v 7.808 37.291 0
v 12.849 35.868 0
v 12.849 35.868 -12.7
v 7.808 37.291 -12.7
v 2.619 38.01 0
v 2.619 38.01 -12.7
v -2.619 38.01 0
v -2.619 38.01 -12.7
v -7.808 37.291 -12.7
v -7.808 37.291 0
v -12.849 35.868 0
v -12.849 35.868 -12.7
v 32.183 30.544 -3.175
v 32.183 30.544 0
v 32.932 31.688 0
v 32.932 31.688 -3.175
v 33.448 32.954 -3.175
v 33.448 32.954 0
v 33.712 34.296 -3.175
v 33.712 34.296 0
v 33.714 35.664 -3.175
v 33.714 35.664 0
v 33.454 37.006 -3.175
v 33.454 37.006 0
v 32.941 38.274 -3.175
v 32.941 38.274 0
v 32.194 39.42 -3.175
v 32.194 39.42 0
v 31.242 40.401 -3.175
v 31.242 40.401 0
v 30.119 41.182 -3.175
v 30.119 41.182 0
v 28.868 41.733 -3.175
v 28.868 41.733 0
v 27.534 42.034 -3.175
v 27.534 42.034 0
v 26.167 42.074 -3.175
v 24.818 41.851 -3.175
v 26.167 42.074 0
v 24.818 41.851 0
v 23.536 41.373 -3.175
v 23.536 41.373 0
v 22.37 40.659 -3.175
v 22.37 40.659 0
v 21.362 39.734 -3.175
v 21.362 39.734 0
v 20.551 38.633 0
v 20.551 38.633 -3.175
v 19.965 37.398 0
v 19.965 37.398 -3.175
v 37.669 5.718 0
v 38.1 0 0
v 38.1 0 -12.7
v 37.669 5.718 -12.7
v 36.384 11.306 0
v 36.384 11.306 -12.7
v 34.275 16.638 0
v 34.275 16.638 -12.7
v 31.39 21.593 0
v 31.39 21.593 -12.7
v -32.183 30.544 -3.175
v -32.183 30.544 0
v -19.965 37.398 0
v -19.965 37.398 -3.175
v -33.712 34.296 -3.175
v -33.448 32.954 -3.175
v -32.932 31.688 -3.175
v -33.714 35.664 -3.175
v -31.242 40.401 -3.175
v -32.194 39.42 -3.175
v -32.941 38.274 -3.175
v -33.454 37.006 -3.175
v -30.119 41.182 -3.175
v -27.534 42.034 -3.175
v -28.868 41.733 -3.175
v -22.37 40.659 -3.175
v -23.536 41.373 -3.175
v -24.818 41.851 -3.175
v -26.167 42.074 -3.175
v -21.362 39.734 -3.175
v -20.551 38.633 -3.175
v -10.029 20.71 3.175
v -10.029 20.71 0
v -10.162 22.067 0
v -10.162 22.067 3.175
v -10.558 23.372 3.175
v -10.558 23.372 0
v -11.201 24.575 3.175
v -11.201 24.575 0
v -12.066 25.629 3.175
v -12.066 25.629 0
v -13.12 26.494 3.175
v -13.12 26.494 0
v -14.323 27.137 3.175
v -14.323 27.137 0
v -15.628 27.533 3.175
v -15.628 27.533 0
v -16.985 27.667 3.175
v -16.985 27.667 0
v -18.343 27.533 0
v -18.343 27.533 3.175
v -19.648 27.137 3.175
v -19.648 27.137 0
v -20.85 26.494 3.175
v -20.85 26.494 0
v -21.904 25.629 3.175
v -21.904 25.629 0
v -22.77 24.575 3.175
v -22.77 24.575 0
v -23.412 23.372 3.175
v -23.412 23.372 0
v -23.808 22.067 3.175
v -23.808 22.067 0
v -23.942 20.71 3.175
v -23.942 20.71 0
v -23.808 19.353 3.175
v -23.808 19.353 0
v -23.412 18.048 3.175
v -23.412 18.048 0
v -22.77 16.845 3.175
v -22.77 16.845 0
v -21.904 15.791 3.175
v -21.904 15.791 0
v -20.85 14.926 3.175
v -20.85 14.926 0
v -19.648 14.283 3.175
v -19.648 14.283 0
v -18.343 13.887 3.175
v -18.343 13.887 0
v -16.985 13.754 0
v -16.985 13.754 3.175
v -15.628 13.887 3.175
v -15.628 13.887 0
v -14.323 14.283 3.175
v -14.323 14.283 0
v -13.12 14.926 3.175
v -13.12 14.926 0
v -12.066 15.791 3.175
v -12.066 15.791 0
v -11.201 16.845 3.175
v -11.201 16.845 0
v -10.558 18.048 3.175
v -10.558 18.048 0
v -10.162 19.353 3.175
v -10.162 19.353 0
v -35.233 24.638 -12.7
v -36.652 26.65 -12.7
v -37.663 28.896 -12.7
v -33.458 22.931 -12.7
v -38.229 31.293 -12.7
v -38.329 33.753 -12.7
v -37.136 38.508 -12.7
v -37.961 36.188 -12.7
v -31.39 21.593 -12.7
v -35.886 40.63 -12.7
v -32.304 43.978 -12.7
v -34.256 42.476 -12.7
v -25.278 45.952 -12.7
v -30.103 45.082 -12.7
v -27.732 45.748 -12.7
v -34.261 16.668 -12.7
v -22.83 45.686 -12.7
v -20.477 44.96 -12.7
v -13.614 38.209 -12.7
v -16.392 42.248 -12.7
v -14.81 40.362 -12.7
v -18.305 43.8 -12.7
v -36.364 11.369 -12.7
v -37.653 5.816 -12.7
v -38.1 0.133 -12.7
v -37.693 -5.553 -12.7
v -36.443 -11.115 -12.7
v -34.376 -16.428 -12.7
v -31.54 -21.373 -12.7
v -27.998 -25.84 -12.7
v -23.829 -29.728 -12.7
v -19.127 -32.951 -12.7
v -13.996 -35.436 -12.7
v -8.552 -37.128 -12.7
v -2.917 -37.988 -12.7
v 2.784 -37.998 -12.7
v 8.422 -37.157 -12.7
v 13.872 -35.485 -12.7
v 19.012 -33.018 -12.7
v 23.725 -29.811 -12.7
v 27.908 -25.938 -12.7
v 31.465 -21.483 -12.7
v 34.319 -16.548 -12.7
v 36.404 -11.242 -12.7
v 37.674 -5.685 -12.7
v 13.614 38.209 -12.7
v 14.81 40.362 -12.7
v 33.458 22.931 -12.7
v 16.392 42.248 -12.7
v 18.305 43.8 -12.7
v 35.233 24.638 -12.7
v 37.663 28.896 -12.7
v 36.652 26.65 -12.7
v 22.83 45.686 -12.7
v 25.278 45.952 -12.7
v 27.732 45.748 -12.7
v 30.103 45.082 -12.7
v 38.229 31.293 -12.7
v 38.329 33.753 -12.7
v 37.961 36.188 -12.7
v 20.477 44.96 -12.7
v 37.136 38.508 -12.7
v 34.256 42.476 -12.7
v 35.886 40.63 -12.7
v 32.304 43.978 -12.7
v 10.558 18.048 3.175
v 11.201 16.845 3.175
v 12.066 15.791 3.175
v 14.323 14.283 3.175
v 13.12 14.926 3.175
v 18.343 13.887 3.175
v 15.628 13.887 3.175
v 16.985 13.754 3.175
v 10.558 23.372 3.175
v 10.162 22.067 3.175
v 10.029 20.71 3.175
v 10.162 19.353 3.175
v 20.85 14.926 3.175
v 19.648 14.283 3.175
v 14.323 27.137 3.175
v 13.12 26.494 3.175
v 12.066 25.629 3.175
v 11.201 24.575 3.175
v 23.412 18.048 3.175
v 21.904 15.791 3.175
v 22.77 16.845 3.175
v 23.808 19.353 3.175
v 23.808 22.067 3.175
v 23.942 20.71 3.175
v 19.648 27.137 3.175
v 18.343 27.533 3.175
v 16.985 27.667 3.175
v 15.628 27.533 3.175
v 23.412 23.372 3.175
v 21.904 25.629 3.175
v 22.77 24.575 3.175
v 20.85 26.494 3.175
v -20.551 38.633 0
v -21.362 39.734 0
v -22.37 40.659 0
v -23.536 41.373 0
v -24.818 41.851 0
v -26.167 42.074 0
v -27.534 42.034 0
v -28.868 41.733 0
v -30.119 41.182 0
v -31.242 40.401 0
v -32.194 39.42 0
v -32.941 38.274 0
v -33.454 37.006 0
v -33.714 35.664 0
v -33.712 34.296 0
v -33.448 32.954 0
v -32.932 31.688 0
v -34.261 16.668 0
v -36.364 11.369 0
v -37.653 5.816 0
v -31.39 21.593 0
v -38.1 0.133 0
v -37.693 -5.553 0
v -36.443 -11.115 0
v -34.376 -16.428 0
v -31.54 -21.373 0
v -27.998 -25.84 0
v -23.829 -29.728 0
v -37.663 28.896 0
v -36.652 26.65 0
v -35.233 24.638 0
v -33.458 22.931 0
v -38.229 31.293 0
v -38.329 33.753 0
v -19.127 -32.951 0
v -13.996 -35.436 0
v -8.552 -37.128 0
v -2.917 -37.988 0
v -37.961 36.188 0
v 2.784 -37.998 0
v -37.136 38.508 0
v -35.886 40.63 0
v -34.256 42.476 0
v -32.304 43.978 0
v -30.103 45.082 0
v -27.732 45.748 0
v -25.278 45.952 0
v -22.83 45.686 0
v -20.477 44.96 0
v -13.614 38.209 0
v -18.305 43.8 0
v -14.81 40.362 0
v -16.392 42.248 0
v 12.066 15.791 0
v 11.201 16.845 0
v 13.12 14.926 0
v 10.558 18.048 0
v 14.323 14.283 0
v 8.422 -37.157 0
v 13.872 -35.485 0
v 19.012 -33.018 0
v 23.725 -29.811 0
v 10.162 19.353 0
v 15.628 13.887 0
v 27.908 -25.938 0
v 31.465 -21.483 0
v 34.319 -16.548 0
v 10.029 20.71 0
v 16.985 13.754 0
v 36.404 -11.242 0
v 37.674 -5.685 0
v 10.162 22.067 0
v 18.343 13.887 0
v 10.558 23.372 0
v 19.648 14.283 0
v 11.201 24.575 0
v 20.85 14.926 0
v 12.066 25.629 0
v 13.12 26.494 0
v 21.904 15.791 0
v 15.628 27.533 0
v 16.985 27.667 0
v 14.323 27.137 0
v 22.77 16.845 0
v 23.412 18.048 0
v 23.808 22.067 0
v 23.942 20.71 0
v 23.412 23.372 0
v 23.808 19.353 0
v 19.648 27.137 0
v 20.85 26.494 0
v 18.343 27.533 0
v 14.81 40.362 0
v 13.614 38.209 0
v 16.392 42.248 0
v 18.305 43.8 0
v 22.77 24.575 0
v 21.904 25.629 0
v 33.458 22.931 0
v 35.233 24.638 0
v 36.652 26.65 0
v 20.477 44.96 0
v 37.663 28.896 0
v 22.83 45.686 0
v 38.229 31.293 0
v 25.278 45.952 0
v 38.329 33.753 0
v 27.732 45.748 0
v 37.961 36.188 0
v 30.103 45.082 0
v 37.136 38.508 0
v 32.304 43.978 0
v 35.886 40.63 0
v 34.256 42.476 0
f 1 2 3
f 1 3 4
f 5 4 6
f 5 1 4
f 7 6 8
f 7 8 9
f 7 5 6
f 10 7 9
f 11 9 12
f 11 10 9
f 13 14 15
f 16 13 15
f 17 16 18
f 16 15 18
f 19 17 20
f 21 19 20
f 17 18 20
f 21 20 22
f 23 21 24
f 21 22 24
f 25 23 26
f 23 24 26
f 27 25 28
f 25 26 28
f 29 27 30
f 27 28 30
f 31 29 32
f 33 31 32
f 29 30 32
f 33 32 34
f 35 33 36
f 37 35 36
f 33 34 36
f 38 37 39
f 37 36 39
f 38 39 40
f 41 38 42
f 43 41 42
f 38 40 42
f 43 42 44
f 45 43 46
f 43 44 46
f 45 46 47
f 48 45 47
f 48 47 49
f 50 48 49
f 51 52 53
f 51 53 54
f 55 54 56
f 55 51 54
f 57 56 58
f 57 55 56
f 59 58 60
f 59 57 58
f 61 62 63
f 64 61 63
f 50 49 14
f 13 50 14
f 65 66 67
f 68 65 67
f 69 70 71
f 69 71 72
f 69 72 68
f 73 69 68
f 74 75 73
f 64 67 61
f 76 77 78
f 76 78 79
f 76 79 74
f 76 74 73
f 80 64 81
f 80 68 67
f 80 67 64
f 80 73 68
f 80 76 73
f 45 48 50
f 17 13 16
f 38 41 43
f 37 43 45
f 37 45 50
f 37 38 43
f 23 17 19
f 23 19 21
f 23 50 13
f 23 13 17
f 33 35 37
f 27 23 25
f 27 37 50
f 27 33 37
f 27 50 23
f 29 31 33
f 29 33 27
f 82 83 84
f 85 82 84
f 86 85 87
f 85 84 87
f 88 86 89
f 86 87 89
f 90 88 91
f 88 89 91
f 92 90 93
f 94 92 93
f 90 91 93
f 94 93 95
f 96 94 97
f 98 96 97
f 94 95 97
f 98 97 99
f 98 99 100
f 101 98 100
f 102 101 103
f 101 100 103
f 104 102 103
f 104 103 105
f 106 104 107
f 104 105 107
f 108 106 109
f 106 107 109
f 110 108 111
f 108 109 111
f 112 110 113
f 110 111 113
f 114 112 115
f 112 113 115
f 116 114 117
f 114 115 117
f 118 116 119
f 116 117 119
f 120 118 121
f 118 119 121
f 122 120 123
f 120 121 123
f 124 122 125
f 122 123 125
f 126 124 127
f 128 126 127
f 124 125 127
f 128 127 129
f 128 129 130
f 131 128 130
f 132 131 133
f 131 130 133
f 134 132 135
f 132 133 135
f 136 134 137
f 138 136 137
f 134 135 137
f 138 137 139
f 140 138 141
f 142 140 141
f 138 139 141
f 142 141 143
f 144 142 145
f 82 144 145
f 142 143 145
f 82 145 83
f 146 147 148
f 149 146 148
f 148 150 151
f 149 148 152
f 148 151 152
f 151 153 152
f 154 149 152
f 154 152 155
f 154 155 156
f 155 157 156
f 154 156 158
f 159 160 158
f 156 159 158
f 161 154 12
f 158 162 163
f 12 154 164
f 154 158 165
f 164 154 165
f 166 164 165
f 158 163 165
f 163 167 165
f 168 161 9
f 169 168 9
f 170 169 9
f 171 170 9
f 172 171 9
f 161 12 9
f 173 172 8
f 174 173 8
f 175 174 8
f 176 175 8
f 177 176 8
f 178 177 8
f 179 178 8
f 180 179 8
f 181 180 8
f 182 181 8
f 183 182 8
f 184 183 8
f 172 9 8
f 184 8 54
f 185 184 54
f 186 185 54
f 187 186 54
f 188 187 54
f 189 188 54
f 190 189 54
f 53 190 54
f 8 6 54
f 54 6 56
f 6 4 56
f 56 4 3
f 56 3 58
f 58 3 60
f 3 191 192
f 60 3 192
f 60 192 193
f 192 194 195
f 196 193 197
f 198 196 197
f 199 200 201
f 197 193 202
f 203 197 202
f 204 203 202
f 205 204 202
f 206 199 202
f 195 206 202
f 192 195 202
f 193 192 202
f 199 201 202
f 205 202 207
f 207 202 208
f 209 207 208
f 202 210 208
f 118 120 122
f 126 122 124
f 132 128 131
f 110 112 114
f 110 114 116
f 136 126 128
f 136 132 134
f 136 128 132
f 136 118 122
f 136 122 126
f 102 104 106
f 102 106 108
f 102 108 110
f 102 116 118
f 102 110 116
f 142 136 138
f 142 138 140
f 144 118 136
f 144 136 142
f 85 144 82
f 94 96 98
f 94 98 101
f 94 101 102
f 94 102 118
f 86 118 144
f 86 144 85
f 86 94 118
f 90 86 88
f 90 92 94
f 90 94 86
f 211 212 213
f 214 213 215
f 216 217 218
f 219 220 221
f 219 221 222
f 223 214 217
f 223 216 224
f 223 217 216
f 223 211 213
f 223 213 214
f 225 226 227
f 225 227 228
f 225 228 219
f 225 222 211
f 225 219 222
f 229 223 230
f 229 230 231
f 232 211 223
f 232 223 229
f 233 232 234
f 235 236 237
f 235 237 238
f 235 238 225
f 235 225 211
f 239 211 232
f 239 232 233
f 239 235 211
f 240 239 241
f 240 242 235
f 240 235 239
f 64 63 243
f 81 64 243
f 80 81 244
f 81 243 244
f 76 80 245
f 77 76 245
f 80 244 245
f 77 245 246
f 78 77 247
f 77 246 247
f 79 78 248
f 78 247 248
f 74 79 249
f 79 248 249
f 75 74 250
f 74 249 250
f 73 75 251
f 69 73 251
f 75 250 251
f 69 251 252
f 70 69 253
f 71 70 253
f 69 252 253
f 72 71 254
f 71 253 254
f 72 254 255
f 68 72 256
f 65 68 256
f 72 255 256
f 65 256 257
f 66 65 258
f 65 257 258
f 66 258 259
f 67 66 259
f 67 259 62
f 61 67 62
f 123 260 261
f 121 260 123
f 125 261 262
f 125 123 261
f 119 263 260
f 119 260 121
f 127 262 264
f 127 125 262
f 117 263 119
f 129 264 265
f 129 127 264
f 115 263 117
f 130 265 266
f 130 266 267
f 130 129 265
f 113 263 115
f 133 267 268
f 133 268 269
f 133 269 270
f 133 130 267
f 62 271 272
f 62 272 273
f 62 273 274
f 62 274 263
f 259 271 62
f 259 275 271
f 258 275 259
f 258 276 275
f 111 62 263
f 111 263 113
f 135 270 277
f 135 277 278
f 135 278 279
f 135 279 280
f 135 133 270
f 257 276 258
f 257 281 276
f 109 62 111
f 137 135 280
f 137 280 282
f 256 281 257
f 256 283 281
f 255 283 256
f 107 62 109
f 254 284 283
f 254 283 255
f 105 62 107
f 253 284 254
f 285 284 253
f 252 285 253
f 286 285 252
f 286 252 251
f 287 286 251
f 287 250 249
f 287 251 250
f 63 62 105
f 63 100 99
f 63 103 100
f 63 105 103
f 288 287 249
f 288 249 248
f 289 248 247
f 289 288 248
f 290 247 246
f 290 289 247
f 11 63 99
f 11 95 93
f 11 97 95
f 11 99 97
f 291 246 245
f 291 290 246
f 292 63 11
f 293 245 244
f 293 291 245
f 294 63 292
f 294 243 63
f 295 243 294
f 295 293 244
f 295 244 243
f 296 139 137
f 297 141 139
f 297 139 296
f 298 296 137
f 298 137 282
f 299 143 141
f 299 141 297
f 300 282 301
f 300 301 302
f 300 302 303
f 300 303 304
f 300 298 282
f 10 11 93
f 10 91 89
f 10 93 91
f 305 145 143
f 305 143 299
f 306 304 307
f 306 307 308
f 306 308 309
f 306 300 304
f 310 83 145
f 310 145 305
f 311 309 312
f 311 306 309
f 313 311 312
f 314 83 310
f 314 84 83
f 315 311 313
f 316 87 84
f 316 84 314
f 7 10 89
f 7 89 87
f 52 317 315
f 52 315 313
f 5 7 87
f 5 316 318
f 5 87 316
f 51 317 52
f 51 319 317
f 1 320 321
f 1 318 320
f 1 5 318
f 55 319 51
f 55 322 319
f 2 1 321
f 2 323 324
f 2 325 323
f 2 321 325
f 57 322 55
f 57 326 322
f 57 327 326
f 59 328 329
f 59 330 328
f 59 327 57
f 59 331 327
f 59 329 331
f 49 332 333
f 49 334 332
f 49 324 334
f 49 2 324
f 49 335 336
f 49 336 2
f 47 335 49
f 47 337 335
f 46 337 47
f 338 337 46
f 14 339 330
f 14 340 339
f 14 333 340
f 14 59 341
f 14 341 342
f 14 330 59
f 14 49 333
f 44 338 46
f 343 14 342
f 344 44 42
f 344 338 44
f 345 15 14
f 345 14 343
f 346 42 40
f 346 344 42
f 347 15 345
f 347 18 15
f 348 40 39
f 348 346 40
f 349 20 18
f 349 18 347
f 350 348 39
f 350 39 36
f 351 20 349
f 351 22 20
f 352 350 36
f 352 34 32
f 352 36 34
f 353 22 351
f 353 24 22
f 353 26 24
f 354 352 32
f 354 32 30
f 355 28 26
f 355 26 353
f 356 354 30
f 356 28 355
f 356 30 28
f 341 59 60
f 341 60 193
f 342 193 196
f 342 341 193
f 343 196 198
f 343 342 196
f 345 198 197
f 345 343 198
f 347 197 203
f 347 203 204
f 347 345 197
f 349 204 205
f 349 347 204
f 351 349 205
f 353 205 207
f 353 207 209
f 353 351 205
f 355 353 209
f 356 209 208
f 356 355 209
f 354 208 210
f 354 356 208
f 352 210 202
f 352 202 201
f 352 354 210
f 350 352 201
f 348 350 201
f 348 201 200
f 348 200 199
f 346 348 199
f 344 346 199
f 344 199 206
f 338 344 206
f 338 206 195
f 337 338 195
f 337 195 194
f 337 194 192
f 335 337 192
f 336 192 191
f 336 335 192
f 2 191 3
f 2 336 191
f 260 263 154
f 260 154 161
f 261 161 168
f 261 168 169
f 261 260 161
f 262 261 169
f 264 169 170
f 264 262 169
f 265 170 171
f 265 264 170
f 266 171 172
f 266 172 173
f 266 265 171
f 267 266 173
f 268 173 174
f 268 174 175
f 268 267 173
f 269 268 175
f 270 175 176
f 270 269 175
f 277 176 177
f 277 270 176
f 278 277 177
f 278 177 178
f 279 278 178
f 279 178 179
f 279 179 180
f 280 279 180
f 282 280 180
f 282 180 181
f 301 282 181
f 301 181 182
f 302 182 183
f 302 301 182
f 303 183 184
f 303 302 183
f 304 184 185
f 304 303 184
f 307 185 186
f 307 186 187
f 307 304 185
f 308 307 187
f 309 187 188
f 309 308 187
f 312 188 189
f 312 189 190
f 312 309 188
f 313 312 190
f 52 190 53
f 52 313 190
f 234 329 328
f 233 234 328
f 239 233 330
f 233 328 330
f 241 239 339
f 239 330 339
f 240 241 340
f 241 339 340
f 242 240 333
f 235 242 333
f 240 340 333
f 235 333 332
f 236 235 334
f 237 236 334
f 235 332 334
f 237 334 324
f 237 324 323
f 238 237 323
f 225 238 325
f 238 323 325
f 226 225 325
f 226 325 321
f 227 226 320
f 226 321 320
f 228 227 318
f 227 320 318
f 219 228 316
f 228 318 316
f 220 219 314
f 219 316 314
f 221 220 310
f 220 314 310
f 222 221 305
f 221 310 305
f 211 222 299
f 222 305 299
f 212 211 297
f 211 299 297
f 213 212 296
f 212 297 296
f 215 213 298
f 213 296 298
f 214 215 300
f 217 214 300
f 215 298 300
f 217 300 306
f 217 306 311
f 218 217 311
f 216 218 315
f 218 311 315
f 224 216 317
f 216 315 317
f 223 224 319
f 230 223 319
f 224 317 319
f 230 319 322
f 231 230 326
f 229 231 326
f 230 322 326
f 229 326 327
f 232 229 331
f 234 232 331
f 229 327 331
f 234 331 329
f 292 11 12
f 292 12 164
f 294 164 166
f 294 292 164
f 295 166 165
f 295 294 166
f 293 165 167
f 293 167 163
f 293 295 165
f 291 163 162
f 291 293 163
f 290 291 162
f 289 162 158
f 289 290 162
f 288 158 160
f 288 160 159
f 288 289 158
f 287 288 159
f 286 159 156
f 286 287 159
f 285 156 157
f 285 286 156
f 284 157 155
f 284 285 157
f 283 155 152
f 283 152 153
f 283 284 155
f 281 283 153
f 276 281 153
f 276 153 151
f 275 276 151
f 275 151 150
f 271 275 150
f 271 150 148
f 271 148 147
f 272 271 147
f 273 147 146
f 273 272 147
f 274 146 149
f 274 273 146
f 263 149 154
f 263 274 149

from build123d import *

# Parameters (mm, degrees)
F1_DEPTH = 12.7
F2_R     = 6.95662
F3_DEPTH = 3.175
F5_DEPTH = 3.175


with BuildPart() as f1:
    # F0 (on Top) → F1 (new body)
    with BuildSketch(Plane.XY):
        with BuildLine():
            ThreePointArc((-31.390282, 21.59306), (-11.305757, -36.383923), (38.1, 0))
            ThreePointArc((38.1, 0), (36.383923, 11.305757), (31.390282, 21.59306))
            ThreePointArc((31.390282, 21.59306), (23.24256, 30.189293), (12.848724, 35.868096))
            ThreePointArc((12.848724, 35.868096), (0, 38.1), (-12.848724, 35.868096))
            ThreePointArc((-12.848724, 35.868096), (-23.24256, 30.189293), (-31.390282, 21.59306))
        make_face()
        with BuildLine():
            ThreePointArc((12.848724, 35.868096), (23.24256, 30.189293), (31.390282, 21.59306))
            ThreePointArc((31.390282, 21.59306), (33.31594, 43.273405), (12.848724, 35.868096))
        make_face()
        with BuildLine():
            ThreePointArc((-12.848724, 35.868096), (-33.31594, 43.273405), (-31.390282, 21.59306))
            ThreePointArc((-31.390282, 21.59306), (-23.24256, 30.189293), (-12.848724, 35.868096))
        make_face()
    extrude(amount=-F1_DEPTH)

    # F2 (on face) → F3 (join)
    with BuildSketch(Plane.XY):
        with Locations((-16.985364, 20.710224)):
            Circle(F2_R)
        with Locations((16.985364, 20.710224)):
            Circle(F2_R)
    extrude(amount=F3_DEPTH)

    # F4 (on face) → F5 (cut)
    with BuildSketch(Plane.XY):
        with BuildLine():
            Line((-32.182794, 30.543854), (-19.965252, 37.397597))
            ThreePointArc((-19.965252, 37.397597), (-30.11931, 41.18189), (-32.182794, 30.543854))
        make_face()
        with BuildLine():
            ThreePointArc((32.182794, 30.543854), (30.11931, 41.18189), (19.965252, 37.397597))
            Line((19.965252, 37.397597), (32.182794, 30.543854))
        make_face()
    extrude(amount=-F5_DEPTH, mode=Mode.SUBTRACT)


solid = f1.part
